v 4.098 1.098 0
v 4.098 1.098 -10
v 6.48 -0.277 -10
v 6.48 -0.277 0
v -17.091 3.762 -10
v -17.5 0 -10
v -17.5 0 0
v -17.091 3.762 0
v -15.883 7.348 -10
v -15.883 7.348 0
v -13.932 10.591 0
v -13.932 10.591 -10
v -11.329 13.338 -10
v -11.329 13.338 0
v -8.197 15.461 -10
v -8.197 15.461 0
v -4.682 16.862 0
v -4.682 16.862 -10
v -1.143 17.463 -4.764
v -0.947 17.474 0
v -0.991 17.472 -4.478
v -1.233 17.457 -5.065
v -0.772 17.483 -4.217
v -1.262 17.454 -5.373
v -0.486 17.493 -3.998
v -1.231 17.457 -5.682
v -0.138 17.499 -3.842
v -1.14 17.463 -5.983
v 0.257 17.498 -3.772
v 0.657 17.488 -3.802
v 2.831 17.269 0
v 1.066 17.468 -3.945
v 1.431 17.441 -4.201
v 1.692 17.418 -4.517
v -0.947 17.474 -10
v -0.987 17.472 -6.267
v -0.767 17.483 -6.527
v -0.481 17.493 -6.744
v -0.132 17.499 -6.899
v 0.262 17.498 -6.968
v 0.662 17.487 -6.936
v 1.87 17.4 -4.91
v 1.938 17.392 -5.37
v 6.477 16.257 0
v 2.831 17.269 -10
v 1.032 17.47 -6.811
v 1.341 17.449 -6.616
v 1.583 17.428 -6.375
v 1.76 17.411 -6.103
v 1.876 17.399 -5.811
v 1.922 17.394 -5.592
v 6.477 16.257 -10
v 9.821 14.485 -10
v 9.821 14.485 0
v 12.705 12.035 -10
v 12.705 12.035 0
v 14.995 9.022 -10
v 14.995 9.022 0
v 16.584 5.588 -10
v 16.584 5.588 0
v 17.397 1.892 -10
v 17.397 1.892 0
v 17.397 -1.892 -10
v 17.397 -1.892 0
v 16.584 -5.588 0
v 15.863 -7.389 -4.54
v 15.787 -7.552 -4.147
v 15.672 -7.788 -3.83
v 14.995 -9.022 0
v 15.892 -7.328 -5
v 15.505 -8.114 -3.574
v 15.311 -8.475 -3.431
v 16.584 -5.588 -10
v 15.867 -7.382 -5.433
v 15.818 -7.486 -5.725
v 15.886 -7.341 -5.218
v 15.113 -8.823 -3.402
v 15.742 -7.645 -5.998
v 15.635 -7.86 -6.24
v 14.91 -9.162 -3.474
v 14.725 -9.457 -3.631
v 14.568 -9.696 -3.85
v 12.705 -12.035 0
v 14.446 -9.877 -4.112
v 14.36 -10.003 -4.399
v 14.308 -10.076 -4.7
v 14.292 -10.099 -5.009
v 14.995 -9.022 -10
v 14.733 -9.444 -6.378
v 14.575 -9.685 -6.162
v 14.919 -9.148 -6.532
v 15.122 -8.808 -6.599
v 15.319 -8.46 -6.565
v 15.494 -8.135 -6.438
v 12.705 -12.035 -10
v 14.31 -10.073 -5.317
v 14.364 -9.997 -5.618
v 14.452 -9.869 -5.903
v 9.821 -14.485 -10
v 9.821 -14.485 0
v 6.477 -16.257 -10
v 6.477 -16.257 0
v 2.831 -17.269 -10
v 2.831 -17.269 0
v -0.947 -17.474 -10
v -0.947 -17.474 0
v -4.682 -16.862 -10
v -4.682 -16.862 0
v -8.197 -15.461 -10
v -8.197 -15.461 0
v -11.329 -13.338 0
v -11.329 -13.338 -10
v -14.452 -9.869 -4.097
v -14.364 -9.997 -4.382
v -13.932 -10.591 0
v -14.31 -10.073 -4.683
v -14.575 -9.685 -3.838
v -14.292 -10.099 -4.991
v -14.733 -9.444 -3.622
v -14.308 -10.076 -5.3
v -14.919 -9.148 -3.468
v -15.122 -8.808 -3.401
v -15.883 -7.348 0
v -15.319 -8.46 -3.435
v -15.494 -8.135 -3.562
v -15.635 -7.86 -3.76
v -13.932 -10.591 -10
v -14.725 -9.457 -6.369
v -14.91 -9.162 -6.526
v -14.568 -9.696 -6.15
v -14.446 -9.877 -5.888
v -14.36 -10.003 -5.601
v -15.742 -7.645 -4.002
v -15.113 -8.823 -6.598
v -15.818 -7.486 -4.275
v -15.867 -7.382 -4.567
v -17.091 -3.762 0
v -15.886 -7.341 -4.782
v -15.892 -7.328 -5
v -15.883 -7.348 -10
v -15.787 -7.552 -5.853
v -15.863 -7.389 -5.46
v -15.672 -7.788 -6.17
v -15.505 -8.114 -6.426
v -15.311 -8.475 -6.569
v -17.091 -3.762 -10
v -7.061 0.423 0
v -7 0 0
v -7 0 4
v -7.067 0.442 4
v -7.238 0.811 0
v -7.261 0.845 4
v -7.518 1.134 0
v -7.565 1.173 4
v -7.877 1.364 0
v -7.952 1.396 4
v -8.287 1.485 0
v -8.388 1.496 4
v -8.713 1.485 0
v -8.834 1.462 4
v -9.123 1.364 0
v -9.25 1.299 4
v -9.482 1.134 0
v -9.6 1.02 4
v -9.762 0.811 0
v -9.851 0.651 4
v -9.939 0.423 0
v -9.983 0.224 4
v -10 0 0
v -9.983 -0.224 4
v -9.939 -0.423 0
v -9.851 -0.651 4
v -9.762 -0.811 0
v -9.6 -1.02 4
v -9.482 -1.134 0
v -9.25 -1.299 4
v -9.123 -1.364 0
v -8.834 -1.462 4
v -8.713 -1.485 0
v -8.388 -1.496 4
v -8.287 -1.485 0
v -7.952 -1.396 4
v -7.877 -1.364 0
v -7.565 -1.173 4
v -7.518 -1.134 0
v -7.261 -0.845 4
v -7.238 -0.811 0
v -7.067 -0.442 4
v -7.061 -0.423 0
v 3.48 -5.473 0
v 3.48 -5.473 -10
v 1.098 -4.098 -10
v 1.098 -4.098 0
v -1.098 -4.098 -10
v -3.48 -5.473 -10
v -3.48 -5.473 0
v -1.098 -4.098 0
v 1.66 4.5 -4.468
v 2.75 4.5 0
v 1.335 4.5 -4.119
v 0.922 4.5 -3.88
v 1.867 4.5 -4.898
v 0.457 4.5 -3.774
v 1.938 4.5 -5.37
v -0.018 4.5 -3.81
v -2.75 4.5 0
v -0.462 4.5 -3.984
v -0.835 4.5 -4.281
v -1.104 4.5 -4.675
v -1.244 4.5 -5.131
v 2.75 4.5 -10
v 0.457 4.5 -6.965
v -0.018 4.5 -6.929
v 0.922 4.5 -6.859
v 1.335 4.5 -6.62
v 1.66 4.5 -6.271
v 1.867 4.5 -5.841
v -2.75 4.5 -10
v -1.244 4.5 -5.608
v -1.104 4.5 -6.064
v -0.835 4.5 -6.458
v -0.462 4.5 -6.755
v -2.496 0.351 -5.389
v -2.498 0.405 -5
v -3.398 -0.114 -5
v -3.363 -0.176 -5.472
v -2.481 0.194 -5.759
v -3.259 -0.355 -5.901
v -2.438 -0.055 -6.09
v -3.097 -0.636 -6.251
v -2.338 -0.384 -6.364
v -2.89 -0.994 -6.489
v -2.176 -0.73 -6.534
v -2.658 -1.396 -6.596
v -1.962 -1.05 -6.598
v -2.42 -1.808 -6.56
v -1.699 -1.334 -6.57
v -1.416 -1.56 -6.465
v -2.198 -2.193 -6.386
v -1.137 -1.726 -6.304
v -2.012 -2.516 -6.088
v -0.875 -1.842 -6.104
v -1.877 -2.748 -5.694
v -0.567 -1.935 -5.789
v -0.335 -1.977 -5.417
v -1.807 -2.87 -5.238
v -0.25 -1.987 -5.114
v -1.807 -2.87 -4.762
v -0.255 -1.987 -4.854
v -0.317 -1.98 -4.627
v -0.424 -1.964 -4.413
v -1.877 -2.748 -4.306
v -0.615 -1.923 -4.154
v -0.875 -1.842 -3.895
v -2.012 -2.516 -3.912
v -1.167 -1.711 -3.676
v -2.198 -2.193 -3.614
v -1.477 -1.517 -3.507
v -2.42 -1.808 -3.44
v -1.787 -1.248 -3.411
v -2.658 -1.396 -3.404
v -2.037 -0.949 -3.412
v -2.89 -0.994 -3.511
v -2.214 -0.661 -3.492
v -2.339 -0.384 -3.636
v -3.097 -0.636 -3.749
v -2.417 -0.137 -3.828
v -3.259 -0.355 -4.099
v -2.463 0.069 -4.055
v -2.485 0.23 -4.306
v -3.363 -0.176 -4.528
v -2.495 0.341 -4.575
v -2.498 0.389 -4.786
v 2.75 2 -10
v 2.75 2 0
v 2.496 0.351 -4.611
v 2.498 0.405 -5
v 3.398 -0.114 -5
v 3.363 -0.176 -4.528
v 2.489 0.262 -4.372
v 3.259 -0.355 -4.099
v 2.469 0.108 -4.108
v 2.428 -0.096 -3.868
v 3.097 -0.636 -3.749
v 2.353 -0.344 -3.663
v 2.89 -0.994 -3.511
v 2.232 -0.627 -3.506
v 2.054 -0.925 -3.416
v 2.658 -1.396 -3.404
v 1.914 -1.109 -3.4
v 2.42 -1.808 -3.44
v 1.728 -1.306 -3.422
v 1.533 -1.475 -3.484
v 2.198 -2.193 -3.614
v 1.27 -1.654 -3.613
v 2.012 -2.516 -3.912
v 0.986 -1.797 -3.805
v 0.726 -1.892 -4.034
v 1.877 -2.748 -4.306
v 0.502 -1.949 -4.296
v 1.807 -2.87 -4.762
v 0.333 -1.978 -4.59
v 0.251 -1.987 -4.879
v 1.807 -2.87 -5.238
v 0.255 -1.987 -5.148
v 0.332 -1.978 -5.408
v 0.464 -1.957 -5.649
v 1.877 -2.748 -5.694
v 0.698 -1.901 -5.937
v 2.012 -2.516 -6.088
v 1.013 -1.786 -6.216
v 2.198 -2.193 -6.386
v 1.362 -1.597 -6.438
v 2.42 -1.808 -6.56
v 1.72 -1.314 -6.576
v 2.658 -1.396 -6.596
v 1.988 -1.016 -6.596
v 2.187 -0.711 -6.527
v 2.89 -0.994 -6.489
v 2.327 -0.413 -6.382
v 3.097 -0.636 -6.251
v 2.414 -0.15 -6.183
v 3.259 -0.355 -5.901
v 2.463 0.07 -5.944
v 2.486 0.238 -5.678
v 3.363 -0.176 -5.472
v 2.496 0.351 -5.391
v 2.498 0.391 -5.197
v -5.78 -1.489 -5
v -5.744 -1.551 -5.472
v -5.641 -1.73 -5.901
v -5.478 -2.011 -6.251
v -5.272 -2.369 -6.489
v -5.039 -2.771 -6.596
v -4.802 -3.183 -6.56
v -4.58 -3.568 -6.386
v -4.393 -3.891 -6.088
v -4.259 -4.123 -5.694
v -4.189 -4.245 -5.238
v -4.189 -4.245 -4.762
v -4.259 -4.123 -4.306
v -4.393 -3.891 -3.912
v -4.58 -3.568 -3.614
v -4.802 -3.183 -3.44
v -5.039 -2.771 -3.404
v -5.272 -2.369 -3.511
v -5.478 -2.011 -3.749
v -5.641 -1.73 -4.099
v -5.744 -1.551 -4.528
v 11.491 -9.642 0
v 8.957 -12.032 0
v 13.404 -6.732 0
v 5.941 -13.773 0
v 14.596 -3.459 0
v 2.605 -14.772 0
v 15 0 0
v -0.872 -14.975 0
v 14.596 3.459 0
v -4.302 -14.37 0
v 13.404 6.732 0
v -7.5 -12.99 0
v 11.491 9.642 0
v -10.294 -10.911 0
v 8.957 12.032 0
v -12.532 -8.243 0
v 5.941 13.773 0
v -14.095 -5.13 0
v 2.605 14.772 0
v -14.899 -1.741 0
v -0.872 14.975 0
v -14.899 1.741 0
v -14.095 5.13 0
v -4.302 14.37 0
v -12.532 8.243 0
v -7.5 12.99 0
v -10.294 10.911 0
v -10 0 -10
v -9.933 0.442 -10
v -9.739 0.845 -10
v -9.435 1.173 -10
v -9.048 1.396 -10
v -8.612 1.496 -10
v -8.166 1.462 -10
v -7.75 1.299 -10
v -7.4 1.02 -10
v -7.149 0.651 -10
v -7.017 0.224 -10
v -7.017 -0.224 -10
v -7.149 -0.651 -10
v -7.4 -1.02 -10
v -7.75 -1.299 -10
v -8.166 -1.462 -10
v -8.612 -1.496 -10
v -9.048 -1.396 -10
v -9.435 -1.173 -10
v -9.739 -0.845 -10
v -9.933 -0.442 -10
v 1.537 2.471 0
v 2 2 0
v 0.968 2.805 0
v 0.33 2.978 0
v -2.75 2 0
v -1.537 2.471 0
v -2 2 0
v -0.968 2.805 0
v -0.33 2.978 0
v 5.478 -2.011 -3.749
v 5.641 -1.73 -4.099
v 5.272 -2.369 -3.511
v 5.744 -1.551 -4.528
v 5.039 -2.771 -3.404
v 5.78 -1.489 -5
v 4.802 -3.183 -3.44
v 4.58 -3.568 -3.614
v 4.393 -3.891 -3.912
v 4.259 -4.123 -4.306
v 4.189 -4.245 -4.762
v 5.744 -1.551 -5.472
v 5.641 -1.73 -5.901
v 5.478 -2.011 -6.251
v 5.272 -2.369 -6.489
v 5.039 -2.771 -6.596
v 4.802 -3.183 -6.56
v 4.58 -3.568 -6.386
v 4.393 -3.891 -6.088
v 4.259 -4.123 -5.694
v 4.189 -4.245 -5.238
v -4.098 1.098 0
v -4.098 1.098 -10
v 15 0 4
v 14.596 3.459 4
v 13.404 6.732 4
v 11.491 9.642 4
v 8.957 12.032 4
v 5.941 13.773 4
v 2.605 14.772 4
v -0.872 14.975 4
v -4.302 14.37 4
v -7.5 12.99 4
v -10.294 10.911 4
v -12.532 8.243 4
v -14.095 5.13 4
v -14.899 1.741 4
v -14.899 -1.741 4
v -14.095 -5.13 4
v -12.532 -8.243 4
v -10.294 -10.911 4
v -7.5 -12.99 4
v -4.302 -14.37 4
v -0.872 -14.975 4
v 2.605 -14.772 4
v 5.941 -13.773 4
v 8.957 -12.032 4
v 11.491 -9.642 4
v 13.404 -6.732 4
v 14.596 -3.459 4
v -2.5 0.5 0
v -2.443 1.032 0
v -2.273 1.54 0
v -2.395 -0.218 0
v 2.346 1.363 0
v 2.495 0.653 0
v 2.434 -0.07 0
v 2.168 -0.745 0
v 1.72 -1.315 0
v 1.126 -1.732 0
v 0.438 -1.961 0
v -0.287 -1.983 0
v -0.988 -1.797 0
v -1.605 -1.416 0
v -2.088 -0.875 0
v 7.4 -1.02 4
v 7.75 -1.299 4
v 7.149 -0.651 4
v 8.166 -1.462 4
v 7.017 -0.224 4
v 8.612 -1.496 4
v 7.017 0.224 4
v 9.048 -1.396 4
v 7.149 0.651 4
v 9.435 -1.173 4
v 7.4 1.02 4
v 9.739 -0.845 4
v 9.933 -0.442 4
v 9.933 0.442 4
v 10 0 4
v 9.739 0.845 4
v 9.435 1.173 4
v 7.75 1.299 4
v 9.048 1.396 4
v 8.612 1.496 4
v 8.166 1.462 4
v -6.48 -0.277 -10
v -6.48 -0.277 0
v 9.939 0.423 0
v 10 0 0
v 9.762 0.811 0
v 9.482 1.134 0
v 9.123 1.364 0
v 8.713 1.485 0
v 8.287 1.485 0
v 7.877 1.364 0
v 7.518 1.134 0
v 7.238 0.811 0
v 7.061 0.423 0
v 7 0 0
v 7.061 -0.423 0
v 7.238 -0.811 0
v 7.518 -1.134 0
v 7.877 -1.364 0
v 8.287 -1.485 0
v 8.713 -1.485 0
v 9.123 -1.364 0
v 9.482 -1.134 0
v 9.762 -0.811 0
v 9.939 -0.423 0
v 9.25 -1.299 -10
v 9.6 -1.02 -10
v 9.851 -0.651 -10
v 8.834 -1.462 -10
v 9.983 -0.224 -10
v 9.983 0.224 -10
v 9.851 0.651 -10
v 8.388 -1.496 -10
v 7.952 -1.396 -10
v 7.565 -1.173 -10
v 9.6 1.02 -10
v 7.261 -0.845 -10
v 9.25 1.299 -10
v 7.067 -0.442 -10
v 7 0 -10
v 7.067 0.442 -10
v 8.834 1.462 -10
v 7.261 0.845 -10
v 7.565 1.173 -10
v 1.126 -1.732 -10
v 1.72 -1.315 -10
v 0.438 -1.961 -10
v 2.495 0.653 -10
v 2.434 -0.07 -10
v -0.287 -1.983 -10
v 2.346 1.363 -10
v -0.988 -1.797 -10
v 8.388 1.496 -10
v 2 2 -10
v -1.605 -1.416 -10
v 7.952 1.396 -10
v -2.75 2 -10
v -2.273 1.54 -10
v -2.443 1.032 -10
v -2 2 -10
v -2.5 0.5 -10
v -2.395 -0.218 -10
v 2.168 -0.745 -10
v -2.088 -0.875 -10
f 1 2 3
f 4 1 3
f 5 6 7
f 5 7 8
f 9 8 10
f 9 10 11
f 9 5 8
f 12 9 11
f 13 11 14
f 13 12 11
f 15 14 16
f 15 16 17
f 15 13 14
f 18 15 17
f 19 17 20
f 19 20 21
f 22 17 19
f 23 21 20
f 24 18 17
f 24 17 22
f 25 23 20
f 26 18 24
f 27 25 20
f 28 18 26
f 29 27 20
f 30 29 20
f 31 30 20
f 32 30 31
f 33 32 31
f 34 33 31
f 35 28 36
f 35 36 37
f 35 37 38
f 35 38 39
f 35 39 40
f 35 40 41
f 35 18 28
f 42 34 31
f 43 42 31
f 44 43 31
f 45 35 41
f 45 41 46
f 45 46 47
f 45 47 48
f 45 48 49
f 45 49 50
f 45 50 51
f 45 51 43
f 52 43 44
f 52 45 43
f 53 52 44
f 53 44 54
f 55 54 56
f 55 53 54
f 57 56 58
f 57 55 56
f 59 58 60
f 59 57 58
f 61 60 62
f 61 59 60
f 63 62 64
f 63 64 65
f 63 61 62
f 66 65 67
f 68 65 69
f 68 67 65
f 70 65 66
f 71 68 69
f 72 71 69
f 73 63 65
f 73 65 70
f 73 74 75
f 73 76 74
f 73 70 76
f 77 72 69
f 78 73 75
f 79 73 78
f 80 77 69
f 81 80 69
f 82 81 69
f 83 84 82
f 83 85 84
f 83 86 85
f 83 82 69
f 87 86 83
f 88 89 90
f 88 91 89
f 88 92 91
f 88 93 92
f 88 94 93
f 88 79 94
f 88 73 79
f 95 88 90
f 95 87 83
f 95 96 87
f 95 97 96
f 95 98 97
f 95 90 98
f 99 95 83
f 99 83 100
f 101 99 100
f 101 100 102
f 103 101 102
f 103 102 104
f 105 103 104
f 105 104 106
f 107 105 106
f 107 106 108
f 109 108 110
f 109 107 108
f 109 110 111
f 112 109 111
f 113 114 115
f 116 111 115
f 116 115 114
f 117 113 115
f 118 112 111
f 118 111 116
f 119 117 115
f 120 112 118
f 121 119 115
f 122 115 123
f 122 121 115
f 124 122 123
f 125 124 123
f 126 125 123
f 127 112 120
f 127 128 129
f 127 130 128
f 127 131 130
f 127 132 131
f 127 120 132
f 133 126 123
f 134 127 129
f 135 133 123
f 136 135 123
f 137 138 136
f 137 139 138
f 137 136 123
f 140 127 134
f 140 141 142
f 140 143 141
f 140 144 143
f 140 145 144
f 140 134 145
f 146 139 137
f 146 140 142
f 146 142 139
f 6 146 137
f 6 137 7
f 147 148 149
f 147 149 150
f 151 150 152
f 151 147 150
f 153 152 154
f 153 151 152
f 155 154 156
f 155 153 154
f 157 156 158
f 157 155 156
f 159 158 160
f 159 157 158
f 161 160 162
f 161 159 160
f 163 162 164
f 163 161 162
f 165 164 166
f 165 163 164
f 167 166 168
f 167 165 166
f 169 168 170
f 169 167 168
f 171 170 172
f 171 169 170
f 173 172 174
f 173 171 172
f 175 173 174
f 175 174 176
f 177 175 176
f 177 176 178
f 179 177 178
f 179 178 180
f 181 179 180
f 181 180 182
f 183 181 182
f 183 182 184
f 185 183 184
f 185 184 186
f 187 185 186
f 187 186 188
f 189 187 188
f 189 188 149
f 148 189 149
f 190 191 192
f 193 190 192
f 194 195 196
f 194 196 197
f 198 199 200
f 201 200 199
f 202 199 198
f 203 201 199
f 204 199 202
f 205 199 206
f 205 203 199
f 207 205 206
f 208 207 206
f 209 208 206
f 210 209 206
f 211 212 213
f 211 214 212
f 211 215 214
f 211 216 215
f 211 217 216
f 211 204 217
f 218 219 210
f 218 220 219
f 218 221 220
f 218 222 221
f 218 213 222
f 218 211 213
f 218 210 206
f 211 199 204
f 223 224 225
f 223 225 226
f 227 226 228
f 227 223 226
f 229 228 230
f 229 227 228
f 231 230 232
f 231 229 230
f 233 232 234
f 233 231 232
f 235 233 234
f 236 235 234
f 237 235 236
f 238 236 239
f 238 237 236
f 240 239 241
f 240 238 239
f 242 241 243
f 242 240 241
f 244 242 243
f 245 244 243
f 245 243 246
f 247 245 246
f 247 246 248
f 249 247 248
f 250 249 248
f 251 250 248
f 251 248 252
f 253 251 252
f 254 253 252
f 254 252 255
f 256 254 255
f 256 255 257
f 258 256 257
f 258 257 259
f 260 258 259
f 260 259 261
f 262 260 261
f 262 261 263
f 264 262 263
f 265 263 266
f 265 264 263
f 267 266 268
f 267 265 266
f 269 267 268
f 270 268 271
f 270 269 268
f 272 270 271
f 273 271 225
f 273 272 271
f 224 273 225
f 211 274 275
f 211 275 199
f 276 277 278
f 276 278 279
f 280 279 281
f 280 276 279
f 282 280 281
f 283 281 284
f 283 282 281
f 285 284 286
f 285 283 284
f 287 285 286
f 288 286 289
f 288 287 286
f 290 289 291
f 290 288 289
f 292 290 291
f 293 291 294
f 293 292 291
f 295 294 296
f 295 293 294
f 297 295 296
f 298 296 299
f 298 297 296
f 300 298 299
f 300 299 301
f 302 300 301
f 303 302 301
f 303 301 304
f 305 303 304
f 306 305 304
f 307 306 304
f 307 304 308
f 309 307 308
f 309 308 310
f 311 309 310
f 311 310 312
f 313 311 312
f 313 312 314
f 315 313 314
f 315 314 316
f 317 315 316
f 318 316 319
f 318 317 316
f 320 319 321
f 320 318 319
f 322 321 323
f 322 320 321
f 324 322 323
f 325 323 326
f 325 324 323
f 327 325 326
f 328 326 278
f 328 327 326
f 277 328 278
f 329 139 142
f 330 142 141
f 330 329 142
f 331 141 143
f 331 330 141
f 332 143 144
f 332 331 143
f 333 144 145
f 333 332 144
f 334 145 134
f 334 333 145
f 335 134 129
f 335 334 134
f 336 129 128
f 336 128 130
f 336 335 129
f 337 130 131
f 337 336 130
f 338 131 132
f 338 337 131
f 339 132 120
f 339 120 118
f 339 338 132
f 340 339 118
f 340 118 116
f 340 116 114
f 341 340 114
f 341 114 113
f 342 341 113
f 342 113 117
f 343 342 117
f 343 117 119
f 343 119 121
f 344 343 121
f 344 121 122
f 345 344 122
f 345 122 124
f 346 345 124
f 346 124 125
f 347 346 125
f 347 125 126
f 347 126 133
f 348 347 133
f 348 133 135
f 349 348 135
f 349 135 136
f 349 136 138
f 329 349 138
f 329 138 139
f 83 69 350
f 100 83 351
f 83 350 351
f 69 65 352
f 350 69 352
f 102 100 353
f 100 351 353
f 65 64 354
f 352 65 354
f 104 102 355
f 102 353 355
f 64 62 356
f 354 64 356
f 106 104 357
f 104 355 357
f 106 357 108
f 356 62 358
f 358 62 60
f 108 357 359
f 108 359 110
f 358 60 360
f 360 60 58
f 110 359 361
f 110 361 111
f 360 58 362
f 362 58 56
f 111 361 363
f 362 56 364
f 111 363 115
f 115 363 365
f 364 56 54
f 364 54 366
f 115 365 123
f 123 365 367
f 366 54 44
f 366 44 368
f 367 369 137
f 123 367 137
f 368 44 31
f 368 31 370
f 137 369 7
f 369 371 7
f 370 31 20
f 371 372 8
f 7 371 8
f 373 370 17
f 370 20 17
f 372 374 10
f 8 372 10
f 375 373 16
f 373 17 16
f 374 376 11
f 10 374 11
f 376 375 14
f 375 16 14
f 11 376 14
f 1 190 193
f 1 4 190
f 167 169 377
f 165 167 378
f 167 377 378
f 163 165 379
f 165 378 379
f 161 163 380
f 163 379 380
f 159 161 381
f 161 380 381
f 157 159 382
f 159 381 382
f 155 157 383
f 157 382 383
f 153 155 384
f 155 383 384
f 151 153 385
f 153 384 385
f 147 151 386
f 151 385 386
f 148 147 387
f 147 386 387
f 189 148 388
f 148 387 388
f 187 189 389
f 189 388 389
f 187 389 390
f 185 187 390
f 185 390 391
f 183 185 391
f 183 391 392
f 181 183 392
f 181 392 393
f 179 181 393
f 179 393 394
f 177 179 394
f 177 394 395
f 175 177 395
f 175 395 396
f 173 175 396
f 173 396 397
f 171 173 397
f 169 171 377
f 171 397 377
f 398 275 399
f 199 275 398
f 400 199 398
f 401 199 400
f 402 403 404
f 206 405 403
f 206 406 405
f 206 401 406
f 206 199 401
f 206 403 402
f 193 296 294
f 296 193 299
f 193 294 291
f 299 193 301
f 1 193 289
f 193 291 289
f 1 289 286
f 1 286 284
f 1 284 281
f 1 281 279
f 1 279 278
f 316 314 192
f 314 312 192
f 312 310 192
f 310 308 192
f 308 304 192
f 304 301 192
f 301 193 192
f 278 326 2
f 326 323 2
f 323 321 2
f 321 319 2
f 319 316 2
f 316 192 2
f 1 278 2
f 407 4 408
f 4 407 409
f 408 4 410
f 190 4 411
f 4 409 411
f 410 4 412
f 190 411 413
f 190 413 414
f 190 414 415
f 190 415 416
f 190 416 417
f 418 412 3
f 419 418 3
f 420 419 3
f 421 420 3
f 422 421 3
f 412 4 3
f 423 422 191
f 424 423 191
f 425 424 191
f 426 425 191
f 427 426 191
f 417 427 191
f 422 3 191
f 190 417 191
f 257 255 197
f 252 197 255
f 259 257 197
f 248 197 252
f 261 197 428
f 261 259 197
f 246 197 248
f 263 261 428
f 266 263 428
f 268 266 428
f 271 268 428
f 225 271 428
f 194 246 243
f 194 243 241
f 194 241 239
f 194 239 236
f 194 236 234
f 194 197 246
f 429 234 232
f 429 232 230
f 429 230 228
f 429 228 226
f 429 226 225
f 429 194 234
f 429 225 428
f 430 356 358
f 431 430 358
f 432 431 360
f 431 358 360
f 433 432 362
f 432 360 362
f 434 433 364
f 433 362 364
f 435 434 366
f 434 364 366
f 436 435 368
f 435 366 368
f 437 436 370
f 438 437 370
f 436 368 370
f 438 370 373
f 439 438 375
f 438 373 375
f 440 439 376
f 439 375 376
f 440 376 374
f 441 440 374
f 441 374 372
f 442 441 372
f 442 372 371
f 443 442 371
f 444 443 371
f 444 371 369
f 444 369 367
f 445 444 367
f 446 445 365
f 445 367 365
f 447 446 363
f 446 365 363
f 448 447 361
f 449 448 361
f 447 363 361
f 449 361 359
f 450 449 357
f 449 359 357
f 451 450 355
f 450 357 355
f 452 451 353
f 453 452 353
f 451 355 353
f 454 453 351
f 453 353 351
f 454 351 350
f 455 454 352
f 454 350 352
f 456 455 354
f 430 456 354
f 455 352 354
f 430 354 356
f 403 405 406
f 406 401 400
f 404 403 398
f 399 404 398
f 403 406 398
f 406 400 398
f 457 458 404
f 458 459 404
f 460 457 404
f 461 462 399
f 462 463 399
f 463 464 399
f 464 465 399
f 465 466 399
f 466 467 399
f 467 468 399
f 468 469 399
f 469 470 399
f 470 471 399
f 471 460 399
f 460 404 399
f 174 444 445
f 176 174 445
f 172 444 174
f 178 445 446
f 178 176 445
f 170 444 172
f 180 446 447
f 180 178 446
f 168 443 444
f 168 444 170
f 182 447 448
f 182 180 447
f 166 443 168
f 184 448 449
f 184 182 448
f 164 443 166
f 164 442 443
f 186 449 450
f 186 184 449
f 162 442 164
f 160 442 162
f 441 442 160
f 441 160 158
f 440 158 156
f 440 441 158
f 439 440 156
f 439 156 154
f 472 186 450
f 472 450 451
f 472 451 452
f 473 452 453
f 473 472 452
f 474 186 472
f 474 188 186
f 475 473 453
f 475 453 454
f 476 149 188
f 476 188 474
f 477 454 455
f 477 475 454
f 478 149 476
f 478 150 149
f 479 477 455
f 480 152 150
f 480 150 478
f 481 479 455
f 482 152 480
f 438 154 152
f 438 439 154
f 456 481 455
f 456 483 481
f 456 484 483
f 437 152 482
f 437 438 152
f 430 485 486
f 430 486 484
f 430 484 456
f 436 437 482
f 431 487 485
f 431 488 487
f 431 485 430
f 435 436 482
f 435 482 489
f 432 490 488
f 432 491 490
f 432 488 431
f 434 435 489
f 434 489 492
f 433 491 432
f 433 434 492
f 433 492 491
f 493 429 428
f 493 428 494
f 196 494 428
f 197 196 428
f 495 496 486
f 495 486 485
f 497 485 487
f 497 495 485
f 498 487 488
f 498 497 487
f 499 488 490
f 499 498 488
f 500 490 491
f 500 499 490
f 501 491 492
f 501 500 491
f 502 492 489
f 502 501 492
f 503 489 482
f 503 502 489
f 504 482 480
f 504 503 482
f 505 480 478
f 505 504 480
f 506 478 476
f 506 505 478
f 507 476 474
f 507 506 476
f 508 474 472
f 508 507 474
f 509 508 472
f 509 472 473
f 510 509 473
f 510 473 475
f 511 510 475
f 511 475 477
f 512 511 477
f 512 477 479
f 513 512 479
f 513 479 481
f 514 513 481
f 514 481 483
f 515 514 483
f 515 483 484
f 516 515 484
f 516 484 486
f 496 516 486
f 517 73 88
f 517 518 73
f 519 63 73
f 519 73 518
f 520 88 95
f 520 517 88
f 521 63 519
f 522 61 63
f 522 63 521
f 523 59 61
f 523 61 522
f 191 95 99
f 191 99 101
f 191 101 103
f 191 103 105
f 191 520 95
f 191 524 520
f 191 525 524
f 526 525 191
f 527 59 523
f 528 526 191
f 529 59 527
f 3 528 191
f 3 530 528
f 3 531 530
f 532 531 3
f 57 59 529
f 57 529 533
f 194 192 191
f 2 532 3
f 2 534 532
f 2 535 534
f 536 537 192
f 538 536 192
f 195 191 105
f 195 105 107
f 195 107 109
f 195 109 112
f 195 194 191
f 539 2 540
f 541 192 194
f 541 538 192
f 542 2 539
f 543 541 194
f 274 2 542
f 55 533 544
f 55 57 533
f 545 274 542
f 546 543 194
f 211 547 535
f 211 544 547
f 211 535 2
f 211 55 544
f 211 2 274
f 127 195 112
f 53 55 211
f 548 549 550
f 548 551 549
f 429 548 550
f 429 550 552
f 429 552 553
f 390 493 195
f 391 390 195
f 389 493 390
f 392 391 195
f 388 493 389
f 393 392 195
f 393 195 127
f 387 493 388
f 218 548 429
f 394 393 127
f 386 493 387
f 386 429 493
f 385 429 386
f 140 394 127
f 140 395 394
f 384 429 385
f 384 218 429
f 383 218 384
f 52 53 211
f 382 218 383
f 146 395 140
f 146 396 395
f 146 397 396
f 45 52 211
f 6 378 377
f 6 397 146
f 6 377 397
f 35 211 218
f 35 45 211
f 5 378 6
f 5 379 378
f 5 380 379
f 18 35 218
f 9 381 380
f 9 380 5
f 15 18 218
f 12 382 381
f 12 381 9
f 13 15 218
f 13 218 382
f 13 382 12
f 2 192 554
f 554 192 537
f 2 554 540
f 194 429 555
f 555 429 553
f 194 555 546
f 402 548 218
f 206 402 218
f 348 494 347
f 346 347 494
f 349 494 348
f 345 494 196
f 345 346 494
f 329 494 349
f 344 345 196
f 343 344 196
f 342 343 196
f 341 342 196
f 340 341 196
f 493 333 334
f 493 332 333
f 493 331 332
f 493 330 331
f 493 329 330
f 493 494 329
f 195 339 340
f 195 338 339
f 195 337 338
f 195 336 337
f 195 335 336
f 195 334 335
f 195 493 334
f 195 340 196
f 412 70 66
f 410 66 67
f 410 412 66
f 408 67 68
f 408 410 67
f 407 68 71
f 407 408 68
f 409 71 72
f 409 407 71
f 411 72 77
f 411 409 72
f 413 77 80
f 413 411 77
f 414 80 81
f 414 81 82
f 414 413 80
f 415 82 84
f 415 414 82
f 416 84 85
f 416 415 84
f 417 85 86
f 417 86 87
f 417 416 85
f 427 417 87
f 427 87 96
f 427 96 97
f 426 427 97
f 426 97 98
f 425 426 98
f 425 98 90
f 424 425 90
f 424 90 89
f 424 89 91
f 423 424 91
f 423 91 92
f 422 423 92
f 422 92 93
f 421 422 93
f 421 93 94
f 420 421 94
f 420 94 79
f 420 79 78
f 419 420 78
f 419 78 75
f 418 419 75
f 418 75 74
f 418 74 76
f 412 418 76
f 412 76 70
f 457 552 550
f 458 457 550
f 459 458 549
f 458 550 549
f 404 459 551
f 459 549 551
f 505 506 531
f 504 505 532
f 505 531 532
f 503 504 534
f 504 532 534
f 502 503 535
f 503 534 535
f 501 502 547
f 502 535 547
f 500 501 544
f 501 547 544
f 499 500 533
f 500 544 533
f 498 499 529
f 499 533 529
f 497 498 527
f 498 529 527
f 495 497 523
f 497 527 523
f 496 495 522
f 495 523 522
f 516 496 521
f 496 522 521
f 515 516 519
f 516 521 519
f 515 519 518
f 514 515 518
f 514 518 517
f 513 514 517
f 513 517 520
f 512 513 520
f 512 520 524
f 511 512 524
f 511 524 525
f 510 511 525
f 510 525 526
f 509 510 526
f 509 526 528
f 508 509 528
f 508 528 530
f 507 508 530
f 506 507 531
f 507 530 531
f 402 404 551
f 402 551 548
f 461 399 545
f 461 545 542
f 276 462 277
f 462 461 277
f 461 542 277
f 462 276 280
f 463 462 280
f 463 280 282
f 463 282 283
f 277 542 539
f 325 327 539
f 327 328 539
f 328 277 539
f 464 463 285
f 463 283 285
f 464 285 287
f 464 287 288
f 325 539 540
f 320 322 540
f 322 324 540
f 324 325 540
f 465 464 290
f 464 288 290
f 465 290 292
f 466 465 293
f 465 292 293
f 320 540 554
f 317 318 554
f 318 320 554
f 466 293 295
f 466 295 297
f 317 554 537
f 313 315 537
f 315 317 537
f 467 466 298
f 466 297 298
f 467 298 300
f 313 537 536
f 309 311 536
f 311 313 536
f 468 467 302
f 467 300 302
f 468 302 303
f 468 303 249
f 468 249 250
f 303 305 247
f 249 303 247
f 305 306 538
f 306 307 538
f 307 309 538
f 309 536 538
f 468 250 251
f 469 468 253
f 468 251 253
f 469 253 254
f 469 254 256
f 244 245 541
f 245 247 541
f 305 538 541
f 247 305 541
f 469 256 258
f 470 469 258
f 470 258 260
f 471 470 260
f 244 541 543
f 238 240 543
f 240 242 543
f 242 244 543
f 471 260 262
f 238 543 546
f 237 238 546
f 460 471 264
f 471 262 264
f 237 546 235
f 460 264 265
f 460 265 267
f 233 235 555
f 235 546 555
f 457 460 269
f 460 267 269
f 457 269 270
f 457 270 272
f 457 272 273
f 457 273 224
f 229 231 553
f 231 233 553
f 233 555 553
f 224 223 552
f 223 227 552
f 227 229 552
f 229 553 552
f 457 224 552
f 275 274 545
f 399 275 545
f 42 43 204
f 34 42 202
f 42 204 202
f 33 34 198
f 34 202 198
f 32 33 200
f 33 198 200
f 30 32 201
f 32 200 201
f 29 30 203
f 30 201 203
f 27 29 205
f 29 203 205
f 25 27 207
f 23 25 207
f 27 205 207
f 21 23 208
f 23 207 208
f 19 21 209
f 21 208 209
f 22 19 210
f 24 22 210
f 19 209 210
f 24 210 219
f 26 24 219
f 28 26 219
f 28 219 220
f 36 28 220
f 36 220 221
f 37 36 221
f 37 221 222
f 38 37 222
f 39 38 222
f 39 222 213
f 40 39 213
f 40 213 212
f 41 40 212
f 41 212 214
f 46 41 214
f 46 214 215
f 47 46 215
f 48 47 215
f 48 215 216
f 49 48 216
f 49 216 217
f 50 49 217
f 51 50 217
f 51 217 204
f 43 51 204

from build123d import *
from build123d.topology import SkipClean

# Parameters (mm, degrees)
SKETCH1_R               = 15
SKETCH1_R_2             = 1.5
BOSS_EXTRUDE1_DEPTH     = 4
BOSS_EXTRUDE2_START     = 10
SKETCH4_R               = 17.5
SKETCH4_R_2             = 2.5
SKETCH4_R_3             = 1.5
BOSS_EXTRUDE2_DEPTH     = 10
SKETCH12_W              = 5.5
SKETCH12_H              = 2.5
CUT_EXTRUDE7_DEPTH      = 10
CUT_EXTRUDE8_DEPTH      = 15
CUT_EXTRUDE8_DEPTH_BACK = 2
SKETCH17_R              = 1.6
CUT_EXTRUDE9_DEPTH      = 30
CUT_EXTRUDE9_DEPTH_BACK = 2
ESBO_O2_R               = 1.6
CORTE_EXTRUS_O1_DEPTH   = 15


with BuildPart() as part:
    # Sketch1 → Boss-Extrude1 (new body)
    with BuildSketch(Plane.XY):
        Circle(SKETCH1_R)
        with Locations((-8.5, 0)):
            Circle(SKETCH1_R_2, mode=Mode.SUBTRACT)
        with Locations((8.5, 0)):
            Circle(SKETCH1_R_2, mode=Mode.SUBTRACT)
    extrude(amount=BOSS_EXTRUDE1_DEPTH)

    # Sketch4 → Boss-Extrude2 (add)
    with SkipClean():  # the faces are left unmerged after this step: merging them gives an invalid solid
        with BuildSketch(Plane(origin=(0, 0, 0), x_dir=(-1, 0, 0), z_dir=(0, 0, -1)).offset(BOSS_EXTRUDE2_START)):
            Circle(SKETCH4_R)
            with Locations((0, 0.5)):
                Circle(SKETCH4_R_2, mode=Mode.SUBTRACT)
            with Locations((8.5, 0)):
                Circle(SKETCH4_R_3, mode=Mode.SUBTRACT)
            with Locations((-8.5, 0)):
                Circle(SKETCH4_R_3, mode=Mode.SUBTRACT)
        extrude(amount=-BOSS_EXTRUDE2_DEPTH)

    # Sketch12 → Cut-Extrude7 (cut)
    with SkipClean():  # the faces are left unmerged after this step: merging them gives an invalid solid
        with BuildSketch(Plane(origin=(0, 0, -10), x_dir=(-1, 0, 0), z_dir=(0, 0, -1))):
            Polygon((1.098076211, -4.098076211), (4.098076211, 1.098076211), (6.479646072, -0.276923789), (3.479646072, -5.473076211), align=None)
            with Locations((0, 3.25)):
                Rectangle(SKETCH12_W, SKETCH12_H)
            Polygon((-3.479646072, -5.473076211), (-1.098076211, -4.098076211), (-4.098076211, 1.098076211), (-6.479646072, -0.276923789), align=None)
        extrude(amount=-CUT_EXTRUDE7_DEPTH, mode=Mode.SUBTRACT)

    # Sketch17 → Cut-Extrude8 (cut, two sides: drawn at the far end of the back side and taken through both)
    with SkipClean():  # the faces are left unmerged after this step: merging them gives an invalid solid
        with BuildSketch(Plane(origin=(2.598076211, -1.5, 0), x_dir=(0, 0, -1), z_dir=(0.8660254037844387, -0.4999999999999998, 0)).offset(-CUT_EXTRUDE8_DEPTH_BACK)):
            with Locations((5, 0)):
                Circle(SKETCH17_R)
        extrude(amount=CUT_EXTRUDE8_DEPTH + CUT_EXTRUDE8_DEPTH_BACK, mode=Mode.SUBTRACT)

    # Sketch18 → Cut-Extrude9 (cut, two sides: drawn at the far end of the back side and taken through both)
    with SkipClean():  # the faces are left unmerged after this step: merging them gives an invalid solid
        with BuildSketch(Plane(origin=(-2.598076211, -1.5, 0), x_dir=(0, 0, 1), z_dir=(-0.8660254037844387, -0.4999999999999998, 0)).offset(-CUT_EXTRUDE9_DEPTH_BACK)):
            with BuildLine():
                ThreePointArc((-6.6, 0), (-5, -1.6), (-3.4, 0))
                ThreePointArc((-3.4, 0), (-5, 1.6), (-6.6, 0))
            make_face()
        extrude(amount=CUT_EXTRUDE9_DEPTH + CUT_EXTRUDE9_DEPTH_BACK, mode=Mode.SUBTRACT)

    # Esboço2 → Corte-extrusão1 (cut)
    with SkipClean():  # the faces are left unmerged after this step: merging them gives an invalid solid
        with BuildSketch(Plane.XZ.offset(-4.5)):
            with Locations((0.337764543, -5.369510029)):
                Circle(ESBO_O2_R)
        extrude(amount=-CORTE_EXTRUS_O1_DEPTH, mode=Mode.SUBTRACT)


solid = part.part
